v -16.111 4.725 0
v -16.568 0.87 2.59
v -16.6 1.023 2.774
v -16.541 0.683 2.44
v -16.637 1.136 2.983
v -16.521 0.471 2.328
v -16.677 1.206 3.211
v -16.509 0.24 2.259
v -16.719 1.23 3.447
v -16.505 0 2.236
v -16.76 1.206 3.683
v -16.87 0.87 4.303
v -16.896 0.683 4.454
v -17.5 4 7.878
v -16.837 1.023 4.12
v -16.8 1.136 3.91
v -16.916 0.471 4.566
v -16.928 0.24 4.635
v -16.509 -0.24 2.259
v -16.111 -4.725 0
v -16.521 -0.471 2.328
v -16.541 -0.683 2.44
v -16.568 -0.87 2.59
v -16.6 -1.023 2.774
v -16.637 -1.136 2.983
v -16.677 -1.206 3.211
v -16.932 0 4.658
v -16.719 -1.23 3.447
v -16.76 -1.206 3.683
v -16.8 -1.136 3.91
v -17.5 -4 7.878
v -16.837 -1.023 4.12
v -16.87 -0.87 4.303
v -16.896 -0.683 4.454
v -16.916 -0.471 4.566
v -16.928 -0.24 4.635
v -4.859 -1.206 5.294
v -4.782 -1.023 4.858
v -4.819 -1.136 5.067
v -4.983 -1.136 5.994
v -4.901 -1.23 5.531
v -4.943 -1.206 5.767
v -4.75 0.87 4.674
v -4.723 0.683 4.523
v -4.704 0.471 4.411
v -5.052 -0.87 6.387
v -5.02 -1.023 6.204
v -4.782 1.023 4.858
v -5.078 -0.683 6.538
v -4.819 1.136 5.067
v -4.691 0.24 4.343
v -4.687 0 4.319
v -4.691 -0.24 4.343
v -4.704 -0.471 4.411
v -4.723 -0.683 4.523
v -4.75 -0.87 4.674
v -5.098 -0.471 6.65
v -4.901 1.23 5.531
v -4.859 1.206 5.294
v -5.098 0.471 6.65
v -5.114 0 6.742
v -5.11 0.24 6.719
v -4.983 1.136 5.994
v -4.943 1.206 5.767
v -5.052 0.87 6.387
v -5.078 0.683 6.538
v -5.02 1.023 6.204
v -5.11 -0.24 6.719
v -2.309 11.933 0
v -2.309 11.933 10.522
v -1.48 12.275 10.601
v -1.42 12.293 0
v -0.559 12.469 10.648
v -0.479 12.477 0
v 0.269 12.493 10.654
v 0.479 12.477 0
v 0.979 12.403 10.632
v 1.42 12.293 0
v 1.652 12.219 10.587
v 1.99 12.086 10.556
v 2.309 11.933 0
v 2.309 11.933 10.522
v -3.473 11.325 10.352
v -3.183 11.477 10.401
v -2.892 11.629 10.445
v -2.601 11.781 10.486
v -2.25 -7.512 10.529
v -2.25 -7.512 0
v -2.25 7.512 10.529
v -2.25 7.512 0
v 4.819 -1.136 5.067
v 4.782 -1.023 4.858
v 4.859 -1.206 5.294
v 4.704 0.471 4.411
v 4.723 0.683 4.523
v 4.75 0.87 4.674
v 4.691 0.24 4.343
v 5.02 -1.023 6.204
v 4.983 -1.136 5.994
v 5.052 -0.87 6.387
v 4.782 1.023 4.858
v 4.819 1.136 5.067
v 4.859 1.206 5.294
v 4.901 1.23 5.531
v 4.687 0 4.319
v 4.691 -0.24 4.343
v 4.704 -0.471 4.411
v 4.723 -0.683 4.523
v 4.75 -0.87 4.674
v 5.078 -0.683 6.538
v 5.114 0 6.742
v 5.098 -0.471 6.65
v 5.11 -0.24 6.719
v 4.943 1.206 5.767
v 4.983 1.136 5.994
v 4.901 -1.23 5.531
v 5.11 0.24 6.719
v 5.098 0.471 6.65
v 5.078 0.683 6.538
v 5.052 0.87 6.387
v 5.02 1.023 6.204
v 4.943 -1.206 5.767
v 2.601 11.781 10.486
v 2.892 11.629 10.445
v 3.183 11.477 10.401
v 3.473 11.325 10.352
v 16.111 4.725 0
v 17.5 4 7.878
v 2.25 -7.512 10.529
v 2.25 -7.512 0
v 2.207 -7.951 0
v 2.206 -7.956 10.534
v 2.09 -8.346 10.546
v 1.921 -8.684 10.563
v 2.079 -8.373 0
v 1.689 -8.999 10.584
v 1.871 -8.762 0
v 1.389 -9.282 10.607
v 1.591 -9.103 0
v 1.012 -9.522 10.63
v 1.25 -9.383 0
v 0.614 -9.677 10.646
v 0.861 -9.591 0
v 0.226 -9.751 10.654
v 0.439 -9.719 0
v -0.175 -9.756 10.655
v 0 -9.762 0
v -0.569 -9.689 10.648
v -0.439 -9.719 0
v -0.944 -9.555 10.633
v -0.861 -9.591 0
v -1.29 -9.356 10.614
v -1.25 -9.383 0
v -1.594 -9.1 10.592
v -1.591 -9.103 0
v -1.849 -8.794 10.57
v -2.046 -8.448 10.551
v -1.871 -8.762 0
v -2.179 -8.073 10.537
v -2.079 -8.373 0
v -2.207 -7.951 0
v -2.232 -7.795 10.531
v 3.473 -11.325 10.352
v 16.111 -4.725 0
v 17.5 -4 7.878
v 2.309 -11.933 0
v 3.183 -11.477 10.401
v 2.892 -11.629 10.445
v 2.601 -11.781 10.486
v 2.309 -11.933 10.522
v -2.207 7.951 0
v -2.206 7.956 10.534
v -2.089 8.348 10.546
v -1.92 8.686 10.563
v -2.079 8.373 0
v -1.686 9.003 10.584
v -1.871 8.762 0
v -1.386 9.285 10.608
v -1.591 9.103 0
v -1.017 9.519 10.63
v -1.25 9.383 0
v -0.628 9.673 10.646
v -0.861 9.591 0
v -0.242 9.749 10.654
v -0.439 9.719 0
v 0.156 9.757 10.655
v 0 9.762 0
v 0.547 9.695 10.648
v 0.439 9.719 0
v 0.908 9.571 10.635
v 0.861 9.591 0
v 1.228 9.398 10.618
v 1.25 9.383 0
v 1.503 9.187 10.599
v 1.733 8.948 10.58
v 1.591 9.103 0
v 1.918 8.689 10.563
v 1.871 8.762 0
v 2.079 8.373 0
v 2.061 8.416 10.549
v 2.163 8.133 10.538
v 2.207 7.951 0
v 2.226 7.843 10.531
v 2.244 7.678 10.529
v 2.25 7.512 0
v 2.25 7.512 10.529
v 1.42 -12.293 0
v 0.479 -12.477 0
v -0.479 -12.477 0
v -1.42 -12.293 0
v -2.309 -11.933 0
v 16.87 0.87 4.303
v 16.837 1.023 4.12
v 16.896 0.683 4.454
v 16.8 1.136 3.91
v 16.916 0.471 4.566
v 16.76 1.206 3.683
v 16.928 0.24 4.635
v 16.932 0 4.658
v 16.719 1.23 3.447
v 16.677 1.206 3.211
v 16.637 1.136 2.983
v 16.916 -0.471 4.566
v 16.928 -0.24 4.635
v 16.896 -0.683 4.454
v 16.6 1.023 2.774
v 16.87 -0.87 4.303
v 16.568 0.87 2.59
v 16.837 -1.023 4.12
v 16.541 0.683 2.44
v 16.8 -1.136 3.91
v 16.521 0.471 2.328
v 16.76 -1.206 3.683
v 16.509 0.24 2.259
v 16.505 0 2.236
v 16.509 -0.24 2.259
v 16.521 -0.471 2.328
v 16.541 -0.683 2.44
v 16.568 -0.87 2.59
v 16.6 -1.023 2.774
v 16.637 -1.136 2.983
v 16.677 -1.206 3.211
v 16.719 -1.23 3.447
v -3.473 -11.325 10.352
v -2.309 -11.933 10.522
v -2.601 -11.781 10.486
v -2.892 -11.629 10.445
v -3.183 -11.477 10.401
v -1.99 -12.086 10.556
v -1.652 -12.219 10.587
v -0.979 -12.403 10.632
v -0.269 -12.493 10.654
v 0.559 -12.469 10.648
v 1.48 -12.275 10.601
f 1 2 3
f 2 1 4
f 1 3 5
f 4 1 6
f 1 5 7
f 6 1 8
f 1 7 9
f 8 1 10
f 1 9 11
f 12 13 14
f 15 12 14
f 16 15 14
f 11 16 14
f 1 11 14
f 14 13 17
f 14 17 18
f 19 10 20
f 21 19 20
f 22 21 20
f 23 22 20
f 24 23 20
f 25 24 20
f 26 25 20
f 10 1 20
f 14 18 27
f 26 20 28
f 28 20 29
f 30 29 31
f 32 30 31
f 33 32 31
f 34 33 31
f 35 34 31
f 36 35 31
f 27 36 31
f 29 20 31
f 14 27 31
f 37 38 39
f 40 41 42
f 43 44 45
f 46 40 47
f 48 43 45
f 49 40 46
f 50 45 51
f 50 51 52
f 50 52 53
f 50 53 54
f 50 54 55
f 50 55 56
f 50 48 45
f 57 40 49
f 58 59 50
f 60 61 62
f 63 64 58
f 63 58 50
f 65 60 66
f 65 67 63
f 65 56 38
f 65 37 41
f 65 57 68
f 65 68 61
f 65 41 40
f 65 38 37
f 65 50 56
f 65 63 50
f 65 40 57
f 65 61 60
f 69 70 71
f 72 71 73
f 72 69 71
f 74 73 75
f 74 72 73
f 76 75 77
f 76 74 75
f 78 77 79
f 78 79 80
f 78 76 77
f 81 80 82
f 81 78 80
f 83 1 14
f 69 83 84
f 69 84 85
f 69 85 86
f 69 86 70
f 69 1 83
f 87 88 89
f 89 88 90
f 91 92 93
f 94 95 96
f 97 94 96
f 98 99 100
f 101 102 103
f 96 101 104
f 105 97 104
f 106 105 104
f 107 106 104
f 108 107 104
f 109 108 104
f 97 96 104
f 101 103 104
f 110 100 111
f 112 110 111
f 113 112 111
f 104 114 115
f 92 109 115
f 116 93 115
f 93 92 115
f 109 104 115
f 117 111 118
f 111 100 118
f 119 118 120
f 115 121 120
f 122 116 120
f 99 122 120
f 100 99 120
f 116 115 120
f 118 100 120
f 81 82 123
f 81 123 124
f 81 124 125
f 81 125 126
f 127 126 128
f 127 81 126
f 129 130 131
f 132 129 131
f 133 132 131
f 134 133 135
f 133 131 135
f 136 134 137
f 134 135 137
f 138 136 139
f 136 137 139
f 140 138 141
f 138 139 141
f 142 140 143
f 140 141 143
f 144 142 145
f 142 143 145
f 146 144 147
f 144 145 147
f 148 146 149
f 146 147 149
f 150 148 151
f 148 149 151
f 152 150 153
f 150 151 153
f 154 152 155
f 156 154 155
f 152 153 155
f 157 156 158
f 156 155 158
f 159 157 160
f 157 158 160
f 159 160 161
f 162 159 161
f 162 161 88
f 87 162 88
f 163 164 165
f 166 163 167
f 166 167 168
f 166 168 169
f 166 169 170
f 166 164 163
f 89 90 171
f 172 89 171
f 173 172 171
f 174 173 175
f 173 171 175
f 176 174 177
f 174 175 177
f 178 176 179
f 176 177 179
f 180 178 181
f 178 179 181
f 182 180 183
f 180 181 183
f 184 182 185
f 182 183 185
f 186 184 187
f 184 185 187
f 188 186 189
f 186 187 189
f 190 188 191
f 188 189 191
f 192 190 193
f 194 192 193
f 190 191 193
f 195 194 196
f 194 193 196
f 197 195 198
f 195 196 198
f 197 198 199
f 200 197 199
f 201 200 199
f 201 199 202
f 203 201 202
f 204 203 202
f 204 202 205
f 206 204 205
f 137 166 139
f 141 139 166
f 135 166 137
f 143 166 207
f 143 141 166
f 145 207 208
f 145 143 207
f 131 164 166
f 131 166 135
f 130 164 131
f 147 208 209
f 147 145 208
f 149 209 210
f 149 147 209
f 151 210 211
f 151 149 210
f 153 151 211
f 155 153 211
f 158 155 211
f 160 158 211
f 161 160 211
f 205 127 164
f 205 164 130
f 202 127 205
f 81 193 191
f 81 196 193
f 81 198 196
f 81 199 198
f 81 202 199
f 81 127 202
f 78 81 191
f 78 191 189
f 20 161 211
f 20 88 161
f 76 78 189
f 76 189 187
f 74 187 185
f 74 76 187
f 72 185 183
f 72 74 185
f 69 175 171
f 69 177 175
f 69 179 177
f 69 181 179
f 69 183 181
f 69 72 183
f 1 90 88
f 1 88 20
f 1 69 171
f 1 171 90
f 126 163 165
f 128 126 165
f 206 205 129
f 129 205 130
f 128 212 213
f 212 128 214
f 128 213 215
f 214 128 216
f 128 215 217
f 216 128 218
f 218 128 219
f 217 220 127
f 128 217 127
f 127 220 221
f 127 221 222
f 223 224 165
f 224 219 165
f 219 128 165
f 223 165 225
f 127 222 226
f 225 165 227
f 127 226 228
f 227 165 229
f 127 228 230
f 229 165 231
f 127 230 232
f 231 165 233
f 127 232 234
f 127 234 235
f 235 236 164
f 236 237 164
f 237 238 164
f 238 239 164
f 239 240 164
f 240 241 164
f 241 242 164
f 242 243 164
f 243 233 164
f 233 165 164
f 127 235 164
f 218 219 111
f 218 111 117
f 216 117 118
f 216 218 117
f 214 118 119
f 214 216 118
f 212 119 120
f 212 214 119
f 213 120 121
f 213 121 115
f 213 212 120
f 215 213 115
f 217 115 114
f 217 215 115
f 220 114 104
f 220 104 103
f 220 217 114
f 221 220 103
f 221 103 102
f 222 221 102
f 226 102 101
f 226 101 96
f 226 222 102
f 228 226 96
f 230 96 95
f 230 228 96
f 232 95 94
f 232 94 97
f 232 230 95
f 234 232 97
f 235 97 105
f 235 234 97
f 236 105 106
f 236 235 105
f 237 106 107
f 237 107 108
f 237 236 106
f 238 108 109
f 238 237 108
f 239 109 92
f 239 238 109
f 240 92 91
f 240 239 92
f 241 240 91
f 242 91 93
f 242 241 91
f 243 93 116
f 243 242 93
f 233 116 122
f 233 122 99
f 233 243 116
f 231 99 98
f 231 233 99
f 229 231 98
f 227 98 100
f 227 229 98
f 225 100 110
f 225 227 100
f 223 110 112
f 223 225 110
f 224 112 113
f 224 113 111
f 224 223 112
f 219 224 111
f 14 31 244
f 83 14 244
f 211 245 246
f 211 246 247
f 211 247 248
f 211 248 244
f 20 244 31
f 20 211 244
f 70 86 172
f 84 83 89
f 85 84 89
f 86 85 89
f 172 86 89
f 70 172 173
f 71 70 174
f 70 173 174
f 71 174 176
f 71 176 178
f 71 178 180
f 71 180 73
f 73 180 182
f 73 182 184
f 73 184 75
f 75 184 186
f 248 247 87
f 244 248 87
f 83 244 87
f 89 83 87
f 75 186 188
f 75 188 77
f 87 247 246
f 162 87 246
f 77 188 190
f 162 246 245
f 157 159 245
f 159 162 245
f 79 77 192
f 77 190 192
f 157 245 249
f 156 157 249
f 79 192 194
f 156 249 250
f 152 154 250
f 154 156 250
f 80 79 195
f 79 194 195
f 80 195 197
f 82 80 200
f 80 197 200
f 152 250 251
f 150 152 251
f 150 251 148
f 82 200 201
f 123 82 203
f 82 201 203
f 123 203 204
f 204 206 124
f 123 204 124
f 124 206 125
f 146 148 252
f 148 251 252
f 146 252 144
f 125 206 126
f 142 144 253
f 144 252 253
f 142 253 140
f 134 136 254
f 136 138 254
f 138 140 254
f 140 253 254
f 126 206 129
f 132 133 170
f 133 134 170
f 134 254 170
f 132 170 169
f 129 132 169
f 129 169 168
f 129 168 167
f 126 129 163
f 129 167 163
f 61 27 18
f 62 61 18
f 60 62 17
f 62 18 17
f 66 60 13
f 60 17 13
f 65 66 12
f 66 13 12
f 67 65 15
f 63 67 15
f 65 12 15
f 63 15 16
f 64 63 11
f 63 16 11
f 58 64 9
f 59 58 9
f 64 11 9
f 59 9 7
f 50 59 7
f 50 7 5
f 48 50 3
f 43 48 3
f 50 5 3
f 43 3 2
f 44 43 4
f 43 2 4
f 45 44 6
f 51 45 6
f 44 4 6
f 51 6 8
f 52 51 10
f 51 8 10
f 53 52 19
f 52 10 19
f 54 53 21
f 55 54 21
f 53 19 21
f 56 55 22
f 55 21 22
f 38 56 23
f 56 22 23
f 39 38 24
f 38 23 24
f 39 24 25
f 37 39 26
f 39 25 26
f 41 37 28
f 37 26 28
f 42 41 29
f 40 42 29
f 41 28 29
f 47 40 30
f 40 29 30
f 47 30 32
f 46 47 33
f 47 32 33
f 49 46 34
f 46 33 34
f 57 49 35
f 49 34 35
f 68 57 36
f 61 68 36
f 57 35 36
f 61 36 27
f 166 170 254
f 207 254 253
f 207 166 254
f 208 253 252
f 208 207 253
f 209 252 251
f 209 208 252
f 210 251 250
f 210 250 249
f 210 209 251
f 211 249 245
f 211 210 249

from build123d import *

# Parameters (mm, degrees)
AUFSATZ_LINEAR_AUSTRAGEN3_DEPTH      = 20
SKIZZE10_OUTSIDE_W                   = 46.486
SKIZZE10_OUTSIDE_H                   = 31.486
SCHNITT_LINEAR_AUSTRAGEN9_DEPTH      = 13.5
SCHNITT_LINEAR_AUSTRAGEN9_DEPTH_BACK = 13.5
SKIZZE7_R                            = 1.23
SCHNITT_LINEAR_AUSTRAGEN8_DEPTH      = 12


with BuildPart() as part:
    # Skizze3 → Aufsatz-Linear austragen3 (new body)
    with BuildSketch(Plane.XY):
        with BuildLine():
            Line((-17.5, 4), (-2.308809744, 11.933429348))
            ThreePointArc((-2.308809744, 11.933429348), (0, 12.5), (2.308809744, 11.933429348))
            Line((2.308809744, 11.933429348), (17.5, 4))
            Line((17.5, 4), (17.5, -4))
            Line((17.5, -4), (2.308809744, -11.933429348))
            ThreePointArc((2.308809744, -11.933429348), (0, -12.5), (-2.308809744, -11.933429348))
            Line((-2.308809744, -11.933429348), (-17.5, -4))
            Line((-17.5, -4), (-17.5, 4))
        make_face()
        with BuildLine():
            Line((-2.25, -7.51244486), (-2.25, 7.51244486))
            ThreePointArc((-2.25, 7.51244486), (0, 9.76244486), (2.25, 7.51244486))
            Line((2.25, 7.51244486), (2.25, -7.51244486))
            ThreePointArc((2.25, -7.51244486), (0, -9.76244486), (-2.25, -7.51244486))
        make_face(mode=Mode.SUBTRACT)
    extrude(amount=AUFSATZ_LINEAR_AUSTRAGEN3_DEPTH)

    # Skizze10 outside → Schnitt-Linear austragen9 (cut, two sides)
    with BuildSketch(Plane(origin=(0, 0, 0), x_dir=(1, 0, 0), z_dir=(0, 1, 0))) as schnitt_linear_austragen9_sk:
        with Locations((0, -10)):
            Rectangle(SKIZZE10_OUTSIDE_W, SKIZZE10_OUTSIDE_H)
        with BuildLine():
            Line((-16.110814579, 0), (-17.5, -7.878462024))
            Line((-17.5, -7.878462024), (-3.472963553, -10.351807009))
            ThreePointArc((-3.472963553, -10.351807009), (0, -10.655651949), (3.472963553, -10.351807009))
            Line((3.472963553, -10.351807009), (17.5, -7.878462024))
            Line((17.5, -7.878462024), (16.110814579, 0))
            Line((16.110814579, 0), (-16.110814579, 0))
        make_face(mode=Mode.SUBTRACT)
    extrude(amount=SCHNITT_LINEAR_AUSTRAGEN9_DEPTH, mode=Mode.SUBTRACT)
    extrude(schnitt_linear_austragen9_sk.sketch, amount=-SCHNITT_LINEAR_AUSTRAGEN9_DEPTH_BACK, mode=Mode.SUBTRACT)

    # Skizze7 → Schnitt-Linear austragen8 (cut)
    with BuildSketch(Plane(origin=(-16.983254832, 0, 4.947854546), x_dir=(-0.173648178, 0, 0.984807753), z_dir=(-0.984807753, 0, -0.173648178))):
        with Locations((-1.524183177, 0)):
            Circle(SKIZZE7_R)
    schnitt_linear_austragen8 = extrude(amount=-SCHNITT_LINEAR_AUSTRAGEN8_DEPTH, mode=Mode.SUBTRACT)

    # Spiegeln4: Schnitt-Linear austragen8 across plane
    add(schnitt_linear_austragen8.mirror(Plane(origin=(0, 0, 0), x_dir=(0, 0, 1), z_dir=(1, 0, 0))), mode=Mode.SUBTRACT)


solid = part.part
